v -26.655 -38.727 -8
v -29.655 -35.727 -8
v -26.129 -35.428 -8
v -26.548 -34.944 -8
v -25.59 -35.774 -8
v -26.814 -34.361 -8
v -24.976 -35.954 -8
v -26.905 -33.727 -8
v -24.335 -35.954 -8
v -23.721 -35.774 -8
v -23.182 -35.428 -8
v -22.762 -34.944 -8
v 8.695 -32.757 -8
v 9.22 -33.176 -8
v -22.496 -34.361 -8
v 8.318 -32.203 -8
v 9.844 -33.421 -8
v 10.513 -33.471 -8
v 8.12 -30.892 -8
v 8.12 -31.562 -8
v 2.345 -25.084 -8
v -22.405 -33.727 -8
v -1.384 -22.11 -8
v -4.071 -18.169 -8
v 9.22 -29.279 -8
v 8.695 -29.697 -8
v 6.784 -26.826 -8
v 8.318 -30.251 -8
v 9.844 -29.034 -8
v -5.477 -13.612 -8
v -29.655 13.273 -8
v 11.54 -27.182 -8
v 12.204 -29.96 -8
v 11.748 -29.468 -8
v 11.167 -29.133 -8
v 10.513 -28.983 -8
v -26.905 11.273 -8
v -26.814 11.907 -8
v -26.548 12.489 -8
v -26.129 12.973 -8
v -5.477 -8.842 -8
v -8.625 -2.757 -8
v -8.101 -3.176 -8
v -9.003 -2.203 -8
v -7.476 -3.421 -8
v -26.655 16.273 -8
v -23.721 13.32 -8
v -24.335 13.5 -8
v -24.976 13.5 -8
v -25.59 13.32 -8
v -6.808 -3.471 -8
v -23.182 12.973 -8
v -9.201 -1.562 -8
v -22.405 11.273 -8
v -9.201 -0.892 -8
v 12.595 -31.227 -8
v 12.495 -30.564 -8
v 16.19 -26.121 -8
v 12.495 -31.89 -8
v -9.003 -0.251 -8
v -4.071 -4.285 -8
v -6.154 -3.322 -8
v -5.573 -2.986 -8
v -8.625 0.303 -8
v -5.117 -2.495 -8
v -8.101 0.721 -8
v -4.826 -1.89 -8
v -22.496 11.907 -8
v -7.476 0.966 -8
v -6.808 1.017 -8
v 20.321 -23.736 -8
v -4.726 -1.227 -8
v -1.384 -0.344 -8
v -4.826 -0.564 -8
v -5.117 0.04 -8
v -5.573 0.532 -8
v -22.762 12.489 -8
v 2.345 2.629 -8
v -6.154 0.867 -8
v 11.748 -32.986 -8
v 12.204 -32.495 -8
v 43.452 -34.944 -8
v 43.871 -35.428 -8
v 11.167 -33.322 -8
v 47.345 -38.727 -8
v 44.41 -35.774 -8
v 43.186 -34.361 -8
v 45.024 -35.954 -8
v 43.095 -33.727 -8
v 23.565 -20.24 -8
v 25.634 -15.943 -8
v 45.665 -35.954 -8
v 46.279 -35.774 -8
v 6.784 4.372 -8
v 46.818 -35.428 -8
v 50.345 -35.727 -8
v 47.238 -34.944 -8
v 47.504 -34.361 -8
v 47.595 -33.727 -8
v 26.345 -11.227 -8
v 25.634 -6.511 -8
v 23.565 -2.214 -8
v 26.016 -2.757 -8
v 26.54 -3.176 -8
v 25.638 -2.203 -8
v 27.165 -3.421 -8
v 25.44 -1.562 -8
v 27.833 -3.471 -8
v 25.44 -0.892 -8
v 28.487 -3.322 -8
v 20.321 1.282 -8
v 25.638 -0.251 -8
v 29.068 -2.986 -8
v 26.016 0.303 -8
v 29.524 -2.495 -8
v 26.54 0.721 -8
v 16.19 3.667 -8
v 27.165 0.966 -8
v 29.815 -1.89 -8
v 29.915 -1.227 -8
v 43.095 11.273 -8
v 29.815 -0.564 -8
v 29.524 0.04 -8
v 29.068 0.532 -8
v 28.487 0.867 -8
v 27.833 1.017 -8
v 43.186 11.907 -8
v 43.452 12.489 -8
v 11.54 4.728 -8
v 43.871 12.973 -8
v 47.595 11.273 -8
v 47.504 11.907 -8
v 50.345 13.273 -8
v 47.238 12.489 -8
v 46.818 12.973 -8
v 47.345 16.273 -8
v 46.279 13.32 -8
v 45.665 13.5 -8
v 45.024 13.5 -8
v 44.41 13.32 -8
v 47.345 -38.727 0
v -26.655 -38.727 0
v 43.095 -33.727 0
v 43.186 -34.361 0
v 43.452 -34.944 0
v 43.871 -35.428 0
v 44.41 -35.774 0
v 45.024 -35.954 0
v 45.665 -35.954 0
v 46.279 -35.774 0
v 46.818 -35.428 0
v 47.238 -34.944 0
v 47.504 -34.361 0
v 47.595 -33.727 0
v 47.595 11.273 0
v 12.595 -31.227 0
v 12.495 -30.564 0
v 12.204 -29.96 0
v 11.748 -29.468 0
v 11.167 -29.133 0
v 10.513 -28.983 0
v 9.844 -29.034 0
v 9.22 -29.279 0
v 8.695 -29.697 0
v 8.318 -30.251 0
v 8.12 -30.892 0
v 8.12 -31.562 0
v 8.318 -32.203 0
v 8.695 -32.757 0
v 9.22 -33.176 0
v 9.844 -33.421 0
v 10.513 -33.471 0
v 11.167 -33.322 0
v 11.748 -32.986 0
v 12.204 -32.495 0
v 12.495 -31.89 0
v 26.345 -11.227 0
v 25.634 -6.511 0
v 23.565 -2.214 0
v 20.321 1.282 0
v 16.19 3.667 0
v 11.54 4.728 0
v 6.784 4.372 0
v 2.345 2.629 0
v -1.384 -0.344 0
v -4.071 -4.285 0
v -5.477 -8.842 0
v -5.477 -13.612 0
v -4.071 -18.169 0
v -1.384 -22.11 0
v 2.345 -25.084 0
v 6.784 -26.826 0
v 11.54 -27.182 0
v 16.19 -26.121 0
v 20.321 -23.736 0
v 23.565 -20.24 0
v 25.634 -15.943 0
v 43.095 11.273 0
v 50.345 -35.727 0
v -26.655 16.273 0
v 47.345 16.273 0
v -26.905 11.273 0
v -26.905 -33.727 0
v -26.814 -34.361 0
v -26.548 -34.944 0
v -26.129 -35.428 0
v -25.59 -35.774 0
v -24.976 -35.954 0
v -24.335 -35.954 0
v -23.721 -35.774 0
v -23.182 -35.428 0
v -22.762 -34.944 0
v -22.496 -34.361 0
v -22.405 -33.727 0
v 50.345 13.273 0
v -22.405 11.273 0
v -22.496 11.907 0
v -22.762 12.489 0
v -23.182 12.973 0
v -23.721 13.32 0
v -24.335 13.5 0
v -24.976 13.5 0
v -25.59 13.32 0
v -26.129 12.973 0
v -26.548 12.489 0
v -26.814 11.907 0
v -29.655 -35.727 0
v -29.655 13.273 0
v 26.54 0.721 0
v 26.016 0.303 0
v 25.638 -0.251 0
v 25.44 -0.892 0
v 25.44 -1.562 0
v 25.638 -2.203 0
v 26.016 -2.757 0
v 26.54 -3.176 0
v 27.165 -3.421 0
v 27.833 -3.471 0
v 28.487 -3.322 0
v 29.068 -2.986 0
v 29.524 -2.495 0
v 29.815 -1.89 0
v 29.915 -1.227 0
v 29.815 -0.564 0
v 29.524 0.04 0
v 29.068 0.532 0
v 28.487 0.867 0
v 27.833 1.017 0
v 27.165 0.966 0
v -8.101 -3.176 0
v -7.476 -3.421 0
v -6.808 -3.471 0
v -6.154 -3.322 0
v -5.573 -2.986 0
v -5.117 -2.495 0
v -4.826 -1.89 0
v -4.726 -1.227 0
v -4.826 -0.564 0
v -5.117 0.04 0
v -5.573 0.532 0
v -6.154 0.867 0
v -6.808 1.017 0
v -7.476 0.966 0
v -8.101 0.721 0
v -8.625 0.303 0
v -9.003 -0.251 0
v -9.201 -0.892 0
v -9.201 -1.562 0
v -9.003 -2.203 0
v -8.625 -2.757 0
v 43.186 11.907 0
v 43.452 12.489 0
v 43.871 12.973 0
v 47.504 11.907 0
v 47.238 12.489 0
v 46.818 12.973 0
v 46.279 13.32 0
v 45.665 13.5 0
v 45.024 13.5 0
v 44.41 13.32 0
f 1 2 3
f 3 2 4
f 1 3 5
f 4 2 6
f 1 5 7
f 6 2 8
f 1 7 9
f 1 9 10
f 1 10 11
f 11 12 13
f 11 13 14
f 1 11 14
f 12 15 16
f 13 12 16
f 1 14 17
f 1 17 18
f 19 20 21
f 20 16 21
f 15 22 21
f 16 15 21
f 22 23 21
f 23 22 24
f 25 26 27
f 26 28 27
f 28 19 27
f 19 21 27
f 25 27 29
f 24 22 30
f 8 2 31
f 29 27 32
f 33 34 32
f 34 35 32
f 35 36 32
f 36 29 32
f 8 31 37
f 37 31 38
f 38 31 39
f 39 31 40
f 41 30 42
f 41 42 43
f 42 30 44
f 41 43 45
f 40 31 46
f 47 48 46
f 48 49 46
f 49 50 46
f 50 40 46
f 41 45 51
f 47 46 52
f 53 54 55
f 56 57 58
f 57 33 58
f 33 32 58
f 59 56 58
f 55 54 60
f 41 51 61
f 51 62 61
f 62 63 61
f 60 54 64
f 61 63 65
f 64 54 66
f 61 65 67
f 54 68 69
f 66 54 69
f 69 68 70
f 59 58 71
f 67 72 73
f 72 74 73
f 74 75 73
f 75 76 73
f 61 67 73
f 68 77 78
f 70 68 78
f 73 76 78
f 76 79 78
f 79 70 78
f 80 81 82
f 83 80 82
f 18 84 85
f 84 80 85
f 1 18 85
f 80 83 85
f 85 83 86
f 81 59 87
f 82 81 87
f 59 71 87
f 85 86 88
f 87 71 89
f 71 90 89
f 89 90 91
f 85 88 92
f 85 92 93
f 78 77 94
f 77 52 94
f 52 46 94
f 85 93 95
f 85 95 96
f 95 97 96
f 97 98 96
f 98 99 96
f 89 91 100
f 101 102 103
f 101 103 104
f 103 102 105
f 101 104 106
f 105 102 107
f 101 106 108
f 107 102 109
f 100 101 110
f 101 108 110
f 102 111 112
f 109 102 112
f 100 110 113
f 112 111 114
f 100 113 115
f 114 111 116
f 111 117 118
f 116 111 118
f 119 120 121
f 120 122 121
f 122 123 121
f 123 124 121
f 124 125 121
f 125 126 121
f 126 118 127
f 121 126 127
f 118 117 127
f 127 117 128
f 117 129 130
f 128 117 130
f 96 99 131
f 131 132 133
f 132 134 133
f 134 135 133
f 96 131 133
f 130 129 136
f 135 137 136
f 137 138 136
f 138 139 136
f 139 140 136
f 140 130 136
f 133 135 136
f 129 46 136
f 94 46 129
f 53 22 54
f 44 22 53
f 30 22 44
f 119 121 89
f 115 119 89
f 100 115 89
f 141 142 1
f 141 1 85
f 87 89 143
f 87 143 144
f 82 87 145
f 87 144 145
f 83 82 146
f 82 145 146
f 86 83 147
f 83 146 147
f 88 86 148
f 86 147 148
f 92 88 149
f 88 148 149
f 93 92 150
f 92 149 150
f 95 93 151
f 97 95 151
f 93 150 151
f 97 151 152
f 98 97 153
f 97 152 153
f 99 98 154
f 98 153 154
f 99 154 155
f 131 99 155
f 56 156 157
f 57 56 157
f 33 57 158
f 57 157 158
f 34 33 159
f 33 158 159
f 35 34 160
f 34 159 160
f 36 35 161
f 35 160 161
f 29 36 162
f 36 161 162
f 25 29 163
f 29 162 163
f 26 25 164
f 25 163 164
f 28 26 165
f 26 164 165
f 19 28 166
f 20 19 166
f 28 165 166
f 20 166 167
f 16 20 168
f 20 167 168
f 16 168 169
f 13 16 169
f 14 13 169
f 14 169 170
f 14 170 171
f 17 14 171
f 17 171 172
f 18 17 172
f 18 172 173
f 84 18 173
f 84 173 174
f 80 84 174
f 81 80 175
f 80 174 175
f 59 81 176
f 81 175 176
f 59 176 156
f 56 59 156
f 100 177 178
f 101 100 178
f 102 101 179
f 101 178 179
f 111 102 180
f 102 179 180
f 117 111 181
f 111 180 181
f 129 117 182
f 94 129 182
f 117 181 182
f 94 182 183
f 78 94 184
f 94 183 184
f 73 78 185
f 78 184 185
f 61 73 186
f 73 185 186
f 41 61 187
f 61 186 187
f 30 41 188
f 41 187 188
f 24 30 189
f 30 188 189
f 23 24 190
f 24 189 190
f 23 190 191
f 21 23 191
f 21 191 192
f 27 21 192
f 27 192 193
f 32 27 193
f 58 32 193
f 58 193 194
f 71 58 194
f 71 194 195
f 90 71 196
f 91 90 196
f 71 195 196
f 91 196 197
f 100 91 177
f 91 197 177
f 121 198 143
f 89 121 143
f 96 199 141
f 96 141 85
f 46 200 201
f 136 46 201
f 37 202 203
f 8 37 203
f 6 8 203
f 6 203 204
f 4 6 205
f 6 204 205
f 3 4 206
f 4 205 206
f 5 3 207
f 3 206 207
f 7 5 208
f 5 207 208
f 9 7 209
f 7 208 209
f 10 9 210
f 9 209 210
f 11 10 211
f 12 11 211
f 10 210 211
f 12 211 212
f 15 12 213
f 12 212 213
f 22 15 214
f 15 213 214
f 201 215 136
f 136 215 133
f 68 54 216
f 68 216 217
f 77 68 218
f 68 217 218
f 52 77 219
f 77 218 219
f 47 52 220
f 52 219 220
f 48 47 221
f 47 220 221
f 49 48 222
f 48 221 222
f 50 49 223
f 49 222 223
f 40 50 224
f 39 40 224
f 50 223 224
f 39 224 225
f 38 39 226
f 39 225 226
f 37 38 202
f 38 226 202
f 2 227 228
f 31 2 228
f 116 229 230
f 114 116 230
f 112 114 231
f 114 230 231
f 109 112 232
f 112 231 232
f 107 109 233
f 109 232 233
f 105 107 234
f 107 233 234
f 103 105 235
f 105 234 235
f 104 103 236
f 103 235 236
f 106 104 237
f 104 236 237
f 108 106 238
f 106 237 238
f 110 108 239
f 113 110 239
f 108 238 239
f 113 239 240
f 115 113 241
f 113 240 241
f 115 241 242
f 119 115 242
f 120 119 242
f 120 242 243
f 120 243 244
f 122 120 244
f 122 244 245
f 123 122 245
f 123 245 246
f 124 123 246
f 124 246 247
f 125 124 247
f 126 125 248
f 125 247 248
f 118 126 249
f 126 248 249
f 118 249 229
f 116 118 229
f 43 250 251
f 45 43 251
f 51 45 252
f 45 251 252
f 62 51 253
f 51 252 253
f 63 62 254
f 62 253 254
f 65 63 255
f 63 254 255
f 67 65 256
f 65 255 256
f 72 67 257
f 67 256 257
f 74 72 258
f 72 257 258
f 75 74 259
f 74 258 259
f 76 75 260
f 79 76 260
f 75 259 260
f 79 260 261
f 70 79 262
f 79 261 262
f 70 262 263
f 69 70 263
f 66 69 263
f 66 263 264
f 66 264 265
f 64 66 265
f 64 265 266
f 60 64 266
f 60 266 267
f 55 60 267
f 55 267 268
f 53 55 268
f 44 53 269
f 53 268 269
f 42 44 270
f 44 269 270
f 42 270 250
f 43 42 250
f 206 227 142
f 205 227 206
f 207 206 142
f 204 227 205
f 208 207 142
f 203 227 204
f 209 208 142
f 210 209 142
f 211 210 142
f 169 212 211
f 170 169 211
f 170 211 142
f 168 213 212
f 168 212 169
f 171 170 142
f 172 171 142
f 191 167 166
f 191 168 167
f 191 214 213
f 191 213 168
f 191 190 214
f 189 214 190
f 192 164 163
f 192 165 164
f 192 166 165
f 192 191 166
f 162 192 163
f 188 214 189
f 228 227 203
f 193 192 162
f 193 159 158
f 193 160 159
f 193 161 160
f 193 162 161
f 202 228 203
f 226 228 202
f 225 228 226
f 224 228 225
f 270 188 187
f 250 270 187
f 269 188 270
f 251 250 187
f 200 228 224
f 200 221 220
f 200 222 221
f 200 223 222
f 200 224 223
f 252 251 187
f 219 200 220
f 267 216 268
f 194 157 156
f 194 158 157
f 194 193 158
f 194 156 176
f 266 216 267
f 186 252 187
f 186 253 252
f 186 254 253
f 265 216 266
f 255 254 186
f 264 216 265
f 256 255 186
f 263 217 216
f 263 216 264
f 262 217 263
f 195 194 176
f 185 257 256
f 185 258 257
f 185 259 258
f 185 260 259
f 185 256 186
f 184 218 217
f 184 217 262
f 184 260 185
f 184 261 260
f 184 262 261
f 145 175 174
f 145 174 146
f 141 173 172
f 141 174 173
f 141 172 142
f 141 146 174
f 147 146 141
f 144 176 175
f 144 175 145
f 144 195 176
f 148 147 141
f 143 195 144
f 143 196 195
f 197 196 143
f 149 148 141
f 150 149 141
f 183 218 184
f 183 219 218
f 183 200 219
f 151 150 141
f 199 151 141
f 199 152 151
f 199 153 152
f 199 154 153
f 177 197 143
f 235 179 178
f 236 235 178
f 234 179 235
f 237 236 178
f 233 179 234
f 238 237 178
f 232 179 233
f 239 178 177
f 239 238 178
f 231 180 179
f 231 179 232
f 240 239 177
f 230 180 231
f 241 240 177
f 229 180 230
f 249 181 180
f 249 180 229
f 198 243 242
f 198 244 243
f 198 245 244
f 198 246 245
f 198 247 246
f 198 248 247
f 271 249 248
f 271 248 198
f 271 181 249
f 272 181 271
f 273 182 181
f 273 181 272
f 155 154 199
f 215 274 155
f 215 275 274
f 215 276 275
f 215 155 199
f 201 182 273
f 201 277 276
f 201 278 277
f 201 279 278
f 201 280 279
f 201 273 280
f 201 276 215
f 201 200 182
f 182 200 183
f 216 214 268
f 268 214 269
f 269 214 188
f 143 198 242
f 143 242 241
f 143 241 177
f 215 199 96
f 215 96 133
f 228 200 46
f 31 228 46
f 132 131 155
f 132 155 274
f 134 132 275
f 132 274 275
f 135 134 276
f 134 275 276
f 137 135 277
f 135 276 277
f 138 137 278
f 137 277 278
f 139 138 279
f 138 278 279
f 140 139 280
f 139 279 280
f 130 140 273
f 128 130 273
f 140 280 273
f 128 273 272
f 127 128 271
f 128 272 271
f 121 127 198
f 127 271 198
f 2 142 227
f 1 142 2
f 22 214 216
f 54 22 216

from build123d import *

# Parameters (mm, degrees)
SKETCH1_W           = 80
SKETCH1_H           = 55
SKETCH1_R           = 16
BOSS_EXTRUDE1_DEPTH = 8
SKETCH2_R           = 2.25
CUT_EXTRUDE1_DEPTH  = 8
CIRPATTERN1_COUNT   = 3
CHAMFER1_SIZE       = 3


with BuildPart() as part:
    # Sketch1 → Boss-Extrude1 (new body)
    with BuildSketch(Plane.XY):
        with Locations((10.344708022, -11.227107004)):
            Rectangle(SKETCH1_W, SKETCH1_H)
        with Locations((10.344708022, -11.227107004)):
            Circle(SKETCH1_R, mode=Mode.SUBTRACT)
        with BuildLine():
            Line((-26.905291978, 11.272892996), (-26.905291978, -33.727107004))
            ThreePointArc((-26.905291978, -33.727107004), (-24.655291978, -35.977107004), (-22.405291978, -33.727107004))
            Line((-22.405291978, -33.727107004), (-22.405291978, 11.272892996))
            ThreePointArc((-22.405291978, 11.272892996), (-24.655291978, 13.522892996), (-26.905291978, 11.272892996))
        make_face(mode=Mode.SUBTRACT)
        with BuildLine():
            Line((43.094708022, 11.272892996), (43.094708022, -33.727107004))
            ThreePointArc((43.094708022, -33.727107004), (45.344708022, -35.977107004), (47.594708022, -33.727107004))
            Line((47.594708022, -33.727107004), (47.594708022, 11.272892996))
            ThreePointArc((47.594708022, 11.272892996), (45.344708022, 13.522892996), (43.094708022, 11.272892996))
        make_face(mode=Mode.SUBTRACT)
    extrude(amount=-BOSS_EXTRUDE1_DEPTH)

    # Sketch2 → Cut-Extrude1 (cut)
    with BuildSketch(Plane.XY):
        with Locations((10.344708022, -31.227107004)):
            Circle(SKETCH2_R)
    cut_extrude1 = extrude(amount=-CUT_EXTRUDE1_DEPTH, mode=Mode.SUBTRACT)

    # CirPattern1: Cut-Extrude1 ×3 about axis
    cirpattern1_axis = Axis((10.344708022, -11.227107004, 0), (0, 0, 1))
    for i in range(1, CIRPATTERN1_COUNT):
        add(cut_extrude1.rotate(cirpattern1_axis, i * 360 / CIRPATTERN1_COUNT), mode=Mode.SUBTRACT)

    # Chamfer1
    chamfer1_edges = [part.edges().sort_by_distance(p)[0] for p in [
        (-29.655291978, 16.272892996, -4),
        (50.344708022, 16.272892996, -4),
        (50.344708022, -38.727107004, -4),
        (-29.655291978, -38.727107004, -4),
    ]]
    chamfer(chamfer1_edges, length=CHAMFER1_SIZE)


solid = part.part
